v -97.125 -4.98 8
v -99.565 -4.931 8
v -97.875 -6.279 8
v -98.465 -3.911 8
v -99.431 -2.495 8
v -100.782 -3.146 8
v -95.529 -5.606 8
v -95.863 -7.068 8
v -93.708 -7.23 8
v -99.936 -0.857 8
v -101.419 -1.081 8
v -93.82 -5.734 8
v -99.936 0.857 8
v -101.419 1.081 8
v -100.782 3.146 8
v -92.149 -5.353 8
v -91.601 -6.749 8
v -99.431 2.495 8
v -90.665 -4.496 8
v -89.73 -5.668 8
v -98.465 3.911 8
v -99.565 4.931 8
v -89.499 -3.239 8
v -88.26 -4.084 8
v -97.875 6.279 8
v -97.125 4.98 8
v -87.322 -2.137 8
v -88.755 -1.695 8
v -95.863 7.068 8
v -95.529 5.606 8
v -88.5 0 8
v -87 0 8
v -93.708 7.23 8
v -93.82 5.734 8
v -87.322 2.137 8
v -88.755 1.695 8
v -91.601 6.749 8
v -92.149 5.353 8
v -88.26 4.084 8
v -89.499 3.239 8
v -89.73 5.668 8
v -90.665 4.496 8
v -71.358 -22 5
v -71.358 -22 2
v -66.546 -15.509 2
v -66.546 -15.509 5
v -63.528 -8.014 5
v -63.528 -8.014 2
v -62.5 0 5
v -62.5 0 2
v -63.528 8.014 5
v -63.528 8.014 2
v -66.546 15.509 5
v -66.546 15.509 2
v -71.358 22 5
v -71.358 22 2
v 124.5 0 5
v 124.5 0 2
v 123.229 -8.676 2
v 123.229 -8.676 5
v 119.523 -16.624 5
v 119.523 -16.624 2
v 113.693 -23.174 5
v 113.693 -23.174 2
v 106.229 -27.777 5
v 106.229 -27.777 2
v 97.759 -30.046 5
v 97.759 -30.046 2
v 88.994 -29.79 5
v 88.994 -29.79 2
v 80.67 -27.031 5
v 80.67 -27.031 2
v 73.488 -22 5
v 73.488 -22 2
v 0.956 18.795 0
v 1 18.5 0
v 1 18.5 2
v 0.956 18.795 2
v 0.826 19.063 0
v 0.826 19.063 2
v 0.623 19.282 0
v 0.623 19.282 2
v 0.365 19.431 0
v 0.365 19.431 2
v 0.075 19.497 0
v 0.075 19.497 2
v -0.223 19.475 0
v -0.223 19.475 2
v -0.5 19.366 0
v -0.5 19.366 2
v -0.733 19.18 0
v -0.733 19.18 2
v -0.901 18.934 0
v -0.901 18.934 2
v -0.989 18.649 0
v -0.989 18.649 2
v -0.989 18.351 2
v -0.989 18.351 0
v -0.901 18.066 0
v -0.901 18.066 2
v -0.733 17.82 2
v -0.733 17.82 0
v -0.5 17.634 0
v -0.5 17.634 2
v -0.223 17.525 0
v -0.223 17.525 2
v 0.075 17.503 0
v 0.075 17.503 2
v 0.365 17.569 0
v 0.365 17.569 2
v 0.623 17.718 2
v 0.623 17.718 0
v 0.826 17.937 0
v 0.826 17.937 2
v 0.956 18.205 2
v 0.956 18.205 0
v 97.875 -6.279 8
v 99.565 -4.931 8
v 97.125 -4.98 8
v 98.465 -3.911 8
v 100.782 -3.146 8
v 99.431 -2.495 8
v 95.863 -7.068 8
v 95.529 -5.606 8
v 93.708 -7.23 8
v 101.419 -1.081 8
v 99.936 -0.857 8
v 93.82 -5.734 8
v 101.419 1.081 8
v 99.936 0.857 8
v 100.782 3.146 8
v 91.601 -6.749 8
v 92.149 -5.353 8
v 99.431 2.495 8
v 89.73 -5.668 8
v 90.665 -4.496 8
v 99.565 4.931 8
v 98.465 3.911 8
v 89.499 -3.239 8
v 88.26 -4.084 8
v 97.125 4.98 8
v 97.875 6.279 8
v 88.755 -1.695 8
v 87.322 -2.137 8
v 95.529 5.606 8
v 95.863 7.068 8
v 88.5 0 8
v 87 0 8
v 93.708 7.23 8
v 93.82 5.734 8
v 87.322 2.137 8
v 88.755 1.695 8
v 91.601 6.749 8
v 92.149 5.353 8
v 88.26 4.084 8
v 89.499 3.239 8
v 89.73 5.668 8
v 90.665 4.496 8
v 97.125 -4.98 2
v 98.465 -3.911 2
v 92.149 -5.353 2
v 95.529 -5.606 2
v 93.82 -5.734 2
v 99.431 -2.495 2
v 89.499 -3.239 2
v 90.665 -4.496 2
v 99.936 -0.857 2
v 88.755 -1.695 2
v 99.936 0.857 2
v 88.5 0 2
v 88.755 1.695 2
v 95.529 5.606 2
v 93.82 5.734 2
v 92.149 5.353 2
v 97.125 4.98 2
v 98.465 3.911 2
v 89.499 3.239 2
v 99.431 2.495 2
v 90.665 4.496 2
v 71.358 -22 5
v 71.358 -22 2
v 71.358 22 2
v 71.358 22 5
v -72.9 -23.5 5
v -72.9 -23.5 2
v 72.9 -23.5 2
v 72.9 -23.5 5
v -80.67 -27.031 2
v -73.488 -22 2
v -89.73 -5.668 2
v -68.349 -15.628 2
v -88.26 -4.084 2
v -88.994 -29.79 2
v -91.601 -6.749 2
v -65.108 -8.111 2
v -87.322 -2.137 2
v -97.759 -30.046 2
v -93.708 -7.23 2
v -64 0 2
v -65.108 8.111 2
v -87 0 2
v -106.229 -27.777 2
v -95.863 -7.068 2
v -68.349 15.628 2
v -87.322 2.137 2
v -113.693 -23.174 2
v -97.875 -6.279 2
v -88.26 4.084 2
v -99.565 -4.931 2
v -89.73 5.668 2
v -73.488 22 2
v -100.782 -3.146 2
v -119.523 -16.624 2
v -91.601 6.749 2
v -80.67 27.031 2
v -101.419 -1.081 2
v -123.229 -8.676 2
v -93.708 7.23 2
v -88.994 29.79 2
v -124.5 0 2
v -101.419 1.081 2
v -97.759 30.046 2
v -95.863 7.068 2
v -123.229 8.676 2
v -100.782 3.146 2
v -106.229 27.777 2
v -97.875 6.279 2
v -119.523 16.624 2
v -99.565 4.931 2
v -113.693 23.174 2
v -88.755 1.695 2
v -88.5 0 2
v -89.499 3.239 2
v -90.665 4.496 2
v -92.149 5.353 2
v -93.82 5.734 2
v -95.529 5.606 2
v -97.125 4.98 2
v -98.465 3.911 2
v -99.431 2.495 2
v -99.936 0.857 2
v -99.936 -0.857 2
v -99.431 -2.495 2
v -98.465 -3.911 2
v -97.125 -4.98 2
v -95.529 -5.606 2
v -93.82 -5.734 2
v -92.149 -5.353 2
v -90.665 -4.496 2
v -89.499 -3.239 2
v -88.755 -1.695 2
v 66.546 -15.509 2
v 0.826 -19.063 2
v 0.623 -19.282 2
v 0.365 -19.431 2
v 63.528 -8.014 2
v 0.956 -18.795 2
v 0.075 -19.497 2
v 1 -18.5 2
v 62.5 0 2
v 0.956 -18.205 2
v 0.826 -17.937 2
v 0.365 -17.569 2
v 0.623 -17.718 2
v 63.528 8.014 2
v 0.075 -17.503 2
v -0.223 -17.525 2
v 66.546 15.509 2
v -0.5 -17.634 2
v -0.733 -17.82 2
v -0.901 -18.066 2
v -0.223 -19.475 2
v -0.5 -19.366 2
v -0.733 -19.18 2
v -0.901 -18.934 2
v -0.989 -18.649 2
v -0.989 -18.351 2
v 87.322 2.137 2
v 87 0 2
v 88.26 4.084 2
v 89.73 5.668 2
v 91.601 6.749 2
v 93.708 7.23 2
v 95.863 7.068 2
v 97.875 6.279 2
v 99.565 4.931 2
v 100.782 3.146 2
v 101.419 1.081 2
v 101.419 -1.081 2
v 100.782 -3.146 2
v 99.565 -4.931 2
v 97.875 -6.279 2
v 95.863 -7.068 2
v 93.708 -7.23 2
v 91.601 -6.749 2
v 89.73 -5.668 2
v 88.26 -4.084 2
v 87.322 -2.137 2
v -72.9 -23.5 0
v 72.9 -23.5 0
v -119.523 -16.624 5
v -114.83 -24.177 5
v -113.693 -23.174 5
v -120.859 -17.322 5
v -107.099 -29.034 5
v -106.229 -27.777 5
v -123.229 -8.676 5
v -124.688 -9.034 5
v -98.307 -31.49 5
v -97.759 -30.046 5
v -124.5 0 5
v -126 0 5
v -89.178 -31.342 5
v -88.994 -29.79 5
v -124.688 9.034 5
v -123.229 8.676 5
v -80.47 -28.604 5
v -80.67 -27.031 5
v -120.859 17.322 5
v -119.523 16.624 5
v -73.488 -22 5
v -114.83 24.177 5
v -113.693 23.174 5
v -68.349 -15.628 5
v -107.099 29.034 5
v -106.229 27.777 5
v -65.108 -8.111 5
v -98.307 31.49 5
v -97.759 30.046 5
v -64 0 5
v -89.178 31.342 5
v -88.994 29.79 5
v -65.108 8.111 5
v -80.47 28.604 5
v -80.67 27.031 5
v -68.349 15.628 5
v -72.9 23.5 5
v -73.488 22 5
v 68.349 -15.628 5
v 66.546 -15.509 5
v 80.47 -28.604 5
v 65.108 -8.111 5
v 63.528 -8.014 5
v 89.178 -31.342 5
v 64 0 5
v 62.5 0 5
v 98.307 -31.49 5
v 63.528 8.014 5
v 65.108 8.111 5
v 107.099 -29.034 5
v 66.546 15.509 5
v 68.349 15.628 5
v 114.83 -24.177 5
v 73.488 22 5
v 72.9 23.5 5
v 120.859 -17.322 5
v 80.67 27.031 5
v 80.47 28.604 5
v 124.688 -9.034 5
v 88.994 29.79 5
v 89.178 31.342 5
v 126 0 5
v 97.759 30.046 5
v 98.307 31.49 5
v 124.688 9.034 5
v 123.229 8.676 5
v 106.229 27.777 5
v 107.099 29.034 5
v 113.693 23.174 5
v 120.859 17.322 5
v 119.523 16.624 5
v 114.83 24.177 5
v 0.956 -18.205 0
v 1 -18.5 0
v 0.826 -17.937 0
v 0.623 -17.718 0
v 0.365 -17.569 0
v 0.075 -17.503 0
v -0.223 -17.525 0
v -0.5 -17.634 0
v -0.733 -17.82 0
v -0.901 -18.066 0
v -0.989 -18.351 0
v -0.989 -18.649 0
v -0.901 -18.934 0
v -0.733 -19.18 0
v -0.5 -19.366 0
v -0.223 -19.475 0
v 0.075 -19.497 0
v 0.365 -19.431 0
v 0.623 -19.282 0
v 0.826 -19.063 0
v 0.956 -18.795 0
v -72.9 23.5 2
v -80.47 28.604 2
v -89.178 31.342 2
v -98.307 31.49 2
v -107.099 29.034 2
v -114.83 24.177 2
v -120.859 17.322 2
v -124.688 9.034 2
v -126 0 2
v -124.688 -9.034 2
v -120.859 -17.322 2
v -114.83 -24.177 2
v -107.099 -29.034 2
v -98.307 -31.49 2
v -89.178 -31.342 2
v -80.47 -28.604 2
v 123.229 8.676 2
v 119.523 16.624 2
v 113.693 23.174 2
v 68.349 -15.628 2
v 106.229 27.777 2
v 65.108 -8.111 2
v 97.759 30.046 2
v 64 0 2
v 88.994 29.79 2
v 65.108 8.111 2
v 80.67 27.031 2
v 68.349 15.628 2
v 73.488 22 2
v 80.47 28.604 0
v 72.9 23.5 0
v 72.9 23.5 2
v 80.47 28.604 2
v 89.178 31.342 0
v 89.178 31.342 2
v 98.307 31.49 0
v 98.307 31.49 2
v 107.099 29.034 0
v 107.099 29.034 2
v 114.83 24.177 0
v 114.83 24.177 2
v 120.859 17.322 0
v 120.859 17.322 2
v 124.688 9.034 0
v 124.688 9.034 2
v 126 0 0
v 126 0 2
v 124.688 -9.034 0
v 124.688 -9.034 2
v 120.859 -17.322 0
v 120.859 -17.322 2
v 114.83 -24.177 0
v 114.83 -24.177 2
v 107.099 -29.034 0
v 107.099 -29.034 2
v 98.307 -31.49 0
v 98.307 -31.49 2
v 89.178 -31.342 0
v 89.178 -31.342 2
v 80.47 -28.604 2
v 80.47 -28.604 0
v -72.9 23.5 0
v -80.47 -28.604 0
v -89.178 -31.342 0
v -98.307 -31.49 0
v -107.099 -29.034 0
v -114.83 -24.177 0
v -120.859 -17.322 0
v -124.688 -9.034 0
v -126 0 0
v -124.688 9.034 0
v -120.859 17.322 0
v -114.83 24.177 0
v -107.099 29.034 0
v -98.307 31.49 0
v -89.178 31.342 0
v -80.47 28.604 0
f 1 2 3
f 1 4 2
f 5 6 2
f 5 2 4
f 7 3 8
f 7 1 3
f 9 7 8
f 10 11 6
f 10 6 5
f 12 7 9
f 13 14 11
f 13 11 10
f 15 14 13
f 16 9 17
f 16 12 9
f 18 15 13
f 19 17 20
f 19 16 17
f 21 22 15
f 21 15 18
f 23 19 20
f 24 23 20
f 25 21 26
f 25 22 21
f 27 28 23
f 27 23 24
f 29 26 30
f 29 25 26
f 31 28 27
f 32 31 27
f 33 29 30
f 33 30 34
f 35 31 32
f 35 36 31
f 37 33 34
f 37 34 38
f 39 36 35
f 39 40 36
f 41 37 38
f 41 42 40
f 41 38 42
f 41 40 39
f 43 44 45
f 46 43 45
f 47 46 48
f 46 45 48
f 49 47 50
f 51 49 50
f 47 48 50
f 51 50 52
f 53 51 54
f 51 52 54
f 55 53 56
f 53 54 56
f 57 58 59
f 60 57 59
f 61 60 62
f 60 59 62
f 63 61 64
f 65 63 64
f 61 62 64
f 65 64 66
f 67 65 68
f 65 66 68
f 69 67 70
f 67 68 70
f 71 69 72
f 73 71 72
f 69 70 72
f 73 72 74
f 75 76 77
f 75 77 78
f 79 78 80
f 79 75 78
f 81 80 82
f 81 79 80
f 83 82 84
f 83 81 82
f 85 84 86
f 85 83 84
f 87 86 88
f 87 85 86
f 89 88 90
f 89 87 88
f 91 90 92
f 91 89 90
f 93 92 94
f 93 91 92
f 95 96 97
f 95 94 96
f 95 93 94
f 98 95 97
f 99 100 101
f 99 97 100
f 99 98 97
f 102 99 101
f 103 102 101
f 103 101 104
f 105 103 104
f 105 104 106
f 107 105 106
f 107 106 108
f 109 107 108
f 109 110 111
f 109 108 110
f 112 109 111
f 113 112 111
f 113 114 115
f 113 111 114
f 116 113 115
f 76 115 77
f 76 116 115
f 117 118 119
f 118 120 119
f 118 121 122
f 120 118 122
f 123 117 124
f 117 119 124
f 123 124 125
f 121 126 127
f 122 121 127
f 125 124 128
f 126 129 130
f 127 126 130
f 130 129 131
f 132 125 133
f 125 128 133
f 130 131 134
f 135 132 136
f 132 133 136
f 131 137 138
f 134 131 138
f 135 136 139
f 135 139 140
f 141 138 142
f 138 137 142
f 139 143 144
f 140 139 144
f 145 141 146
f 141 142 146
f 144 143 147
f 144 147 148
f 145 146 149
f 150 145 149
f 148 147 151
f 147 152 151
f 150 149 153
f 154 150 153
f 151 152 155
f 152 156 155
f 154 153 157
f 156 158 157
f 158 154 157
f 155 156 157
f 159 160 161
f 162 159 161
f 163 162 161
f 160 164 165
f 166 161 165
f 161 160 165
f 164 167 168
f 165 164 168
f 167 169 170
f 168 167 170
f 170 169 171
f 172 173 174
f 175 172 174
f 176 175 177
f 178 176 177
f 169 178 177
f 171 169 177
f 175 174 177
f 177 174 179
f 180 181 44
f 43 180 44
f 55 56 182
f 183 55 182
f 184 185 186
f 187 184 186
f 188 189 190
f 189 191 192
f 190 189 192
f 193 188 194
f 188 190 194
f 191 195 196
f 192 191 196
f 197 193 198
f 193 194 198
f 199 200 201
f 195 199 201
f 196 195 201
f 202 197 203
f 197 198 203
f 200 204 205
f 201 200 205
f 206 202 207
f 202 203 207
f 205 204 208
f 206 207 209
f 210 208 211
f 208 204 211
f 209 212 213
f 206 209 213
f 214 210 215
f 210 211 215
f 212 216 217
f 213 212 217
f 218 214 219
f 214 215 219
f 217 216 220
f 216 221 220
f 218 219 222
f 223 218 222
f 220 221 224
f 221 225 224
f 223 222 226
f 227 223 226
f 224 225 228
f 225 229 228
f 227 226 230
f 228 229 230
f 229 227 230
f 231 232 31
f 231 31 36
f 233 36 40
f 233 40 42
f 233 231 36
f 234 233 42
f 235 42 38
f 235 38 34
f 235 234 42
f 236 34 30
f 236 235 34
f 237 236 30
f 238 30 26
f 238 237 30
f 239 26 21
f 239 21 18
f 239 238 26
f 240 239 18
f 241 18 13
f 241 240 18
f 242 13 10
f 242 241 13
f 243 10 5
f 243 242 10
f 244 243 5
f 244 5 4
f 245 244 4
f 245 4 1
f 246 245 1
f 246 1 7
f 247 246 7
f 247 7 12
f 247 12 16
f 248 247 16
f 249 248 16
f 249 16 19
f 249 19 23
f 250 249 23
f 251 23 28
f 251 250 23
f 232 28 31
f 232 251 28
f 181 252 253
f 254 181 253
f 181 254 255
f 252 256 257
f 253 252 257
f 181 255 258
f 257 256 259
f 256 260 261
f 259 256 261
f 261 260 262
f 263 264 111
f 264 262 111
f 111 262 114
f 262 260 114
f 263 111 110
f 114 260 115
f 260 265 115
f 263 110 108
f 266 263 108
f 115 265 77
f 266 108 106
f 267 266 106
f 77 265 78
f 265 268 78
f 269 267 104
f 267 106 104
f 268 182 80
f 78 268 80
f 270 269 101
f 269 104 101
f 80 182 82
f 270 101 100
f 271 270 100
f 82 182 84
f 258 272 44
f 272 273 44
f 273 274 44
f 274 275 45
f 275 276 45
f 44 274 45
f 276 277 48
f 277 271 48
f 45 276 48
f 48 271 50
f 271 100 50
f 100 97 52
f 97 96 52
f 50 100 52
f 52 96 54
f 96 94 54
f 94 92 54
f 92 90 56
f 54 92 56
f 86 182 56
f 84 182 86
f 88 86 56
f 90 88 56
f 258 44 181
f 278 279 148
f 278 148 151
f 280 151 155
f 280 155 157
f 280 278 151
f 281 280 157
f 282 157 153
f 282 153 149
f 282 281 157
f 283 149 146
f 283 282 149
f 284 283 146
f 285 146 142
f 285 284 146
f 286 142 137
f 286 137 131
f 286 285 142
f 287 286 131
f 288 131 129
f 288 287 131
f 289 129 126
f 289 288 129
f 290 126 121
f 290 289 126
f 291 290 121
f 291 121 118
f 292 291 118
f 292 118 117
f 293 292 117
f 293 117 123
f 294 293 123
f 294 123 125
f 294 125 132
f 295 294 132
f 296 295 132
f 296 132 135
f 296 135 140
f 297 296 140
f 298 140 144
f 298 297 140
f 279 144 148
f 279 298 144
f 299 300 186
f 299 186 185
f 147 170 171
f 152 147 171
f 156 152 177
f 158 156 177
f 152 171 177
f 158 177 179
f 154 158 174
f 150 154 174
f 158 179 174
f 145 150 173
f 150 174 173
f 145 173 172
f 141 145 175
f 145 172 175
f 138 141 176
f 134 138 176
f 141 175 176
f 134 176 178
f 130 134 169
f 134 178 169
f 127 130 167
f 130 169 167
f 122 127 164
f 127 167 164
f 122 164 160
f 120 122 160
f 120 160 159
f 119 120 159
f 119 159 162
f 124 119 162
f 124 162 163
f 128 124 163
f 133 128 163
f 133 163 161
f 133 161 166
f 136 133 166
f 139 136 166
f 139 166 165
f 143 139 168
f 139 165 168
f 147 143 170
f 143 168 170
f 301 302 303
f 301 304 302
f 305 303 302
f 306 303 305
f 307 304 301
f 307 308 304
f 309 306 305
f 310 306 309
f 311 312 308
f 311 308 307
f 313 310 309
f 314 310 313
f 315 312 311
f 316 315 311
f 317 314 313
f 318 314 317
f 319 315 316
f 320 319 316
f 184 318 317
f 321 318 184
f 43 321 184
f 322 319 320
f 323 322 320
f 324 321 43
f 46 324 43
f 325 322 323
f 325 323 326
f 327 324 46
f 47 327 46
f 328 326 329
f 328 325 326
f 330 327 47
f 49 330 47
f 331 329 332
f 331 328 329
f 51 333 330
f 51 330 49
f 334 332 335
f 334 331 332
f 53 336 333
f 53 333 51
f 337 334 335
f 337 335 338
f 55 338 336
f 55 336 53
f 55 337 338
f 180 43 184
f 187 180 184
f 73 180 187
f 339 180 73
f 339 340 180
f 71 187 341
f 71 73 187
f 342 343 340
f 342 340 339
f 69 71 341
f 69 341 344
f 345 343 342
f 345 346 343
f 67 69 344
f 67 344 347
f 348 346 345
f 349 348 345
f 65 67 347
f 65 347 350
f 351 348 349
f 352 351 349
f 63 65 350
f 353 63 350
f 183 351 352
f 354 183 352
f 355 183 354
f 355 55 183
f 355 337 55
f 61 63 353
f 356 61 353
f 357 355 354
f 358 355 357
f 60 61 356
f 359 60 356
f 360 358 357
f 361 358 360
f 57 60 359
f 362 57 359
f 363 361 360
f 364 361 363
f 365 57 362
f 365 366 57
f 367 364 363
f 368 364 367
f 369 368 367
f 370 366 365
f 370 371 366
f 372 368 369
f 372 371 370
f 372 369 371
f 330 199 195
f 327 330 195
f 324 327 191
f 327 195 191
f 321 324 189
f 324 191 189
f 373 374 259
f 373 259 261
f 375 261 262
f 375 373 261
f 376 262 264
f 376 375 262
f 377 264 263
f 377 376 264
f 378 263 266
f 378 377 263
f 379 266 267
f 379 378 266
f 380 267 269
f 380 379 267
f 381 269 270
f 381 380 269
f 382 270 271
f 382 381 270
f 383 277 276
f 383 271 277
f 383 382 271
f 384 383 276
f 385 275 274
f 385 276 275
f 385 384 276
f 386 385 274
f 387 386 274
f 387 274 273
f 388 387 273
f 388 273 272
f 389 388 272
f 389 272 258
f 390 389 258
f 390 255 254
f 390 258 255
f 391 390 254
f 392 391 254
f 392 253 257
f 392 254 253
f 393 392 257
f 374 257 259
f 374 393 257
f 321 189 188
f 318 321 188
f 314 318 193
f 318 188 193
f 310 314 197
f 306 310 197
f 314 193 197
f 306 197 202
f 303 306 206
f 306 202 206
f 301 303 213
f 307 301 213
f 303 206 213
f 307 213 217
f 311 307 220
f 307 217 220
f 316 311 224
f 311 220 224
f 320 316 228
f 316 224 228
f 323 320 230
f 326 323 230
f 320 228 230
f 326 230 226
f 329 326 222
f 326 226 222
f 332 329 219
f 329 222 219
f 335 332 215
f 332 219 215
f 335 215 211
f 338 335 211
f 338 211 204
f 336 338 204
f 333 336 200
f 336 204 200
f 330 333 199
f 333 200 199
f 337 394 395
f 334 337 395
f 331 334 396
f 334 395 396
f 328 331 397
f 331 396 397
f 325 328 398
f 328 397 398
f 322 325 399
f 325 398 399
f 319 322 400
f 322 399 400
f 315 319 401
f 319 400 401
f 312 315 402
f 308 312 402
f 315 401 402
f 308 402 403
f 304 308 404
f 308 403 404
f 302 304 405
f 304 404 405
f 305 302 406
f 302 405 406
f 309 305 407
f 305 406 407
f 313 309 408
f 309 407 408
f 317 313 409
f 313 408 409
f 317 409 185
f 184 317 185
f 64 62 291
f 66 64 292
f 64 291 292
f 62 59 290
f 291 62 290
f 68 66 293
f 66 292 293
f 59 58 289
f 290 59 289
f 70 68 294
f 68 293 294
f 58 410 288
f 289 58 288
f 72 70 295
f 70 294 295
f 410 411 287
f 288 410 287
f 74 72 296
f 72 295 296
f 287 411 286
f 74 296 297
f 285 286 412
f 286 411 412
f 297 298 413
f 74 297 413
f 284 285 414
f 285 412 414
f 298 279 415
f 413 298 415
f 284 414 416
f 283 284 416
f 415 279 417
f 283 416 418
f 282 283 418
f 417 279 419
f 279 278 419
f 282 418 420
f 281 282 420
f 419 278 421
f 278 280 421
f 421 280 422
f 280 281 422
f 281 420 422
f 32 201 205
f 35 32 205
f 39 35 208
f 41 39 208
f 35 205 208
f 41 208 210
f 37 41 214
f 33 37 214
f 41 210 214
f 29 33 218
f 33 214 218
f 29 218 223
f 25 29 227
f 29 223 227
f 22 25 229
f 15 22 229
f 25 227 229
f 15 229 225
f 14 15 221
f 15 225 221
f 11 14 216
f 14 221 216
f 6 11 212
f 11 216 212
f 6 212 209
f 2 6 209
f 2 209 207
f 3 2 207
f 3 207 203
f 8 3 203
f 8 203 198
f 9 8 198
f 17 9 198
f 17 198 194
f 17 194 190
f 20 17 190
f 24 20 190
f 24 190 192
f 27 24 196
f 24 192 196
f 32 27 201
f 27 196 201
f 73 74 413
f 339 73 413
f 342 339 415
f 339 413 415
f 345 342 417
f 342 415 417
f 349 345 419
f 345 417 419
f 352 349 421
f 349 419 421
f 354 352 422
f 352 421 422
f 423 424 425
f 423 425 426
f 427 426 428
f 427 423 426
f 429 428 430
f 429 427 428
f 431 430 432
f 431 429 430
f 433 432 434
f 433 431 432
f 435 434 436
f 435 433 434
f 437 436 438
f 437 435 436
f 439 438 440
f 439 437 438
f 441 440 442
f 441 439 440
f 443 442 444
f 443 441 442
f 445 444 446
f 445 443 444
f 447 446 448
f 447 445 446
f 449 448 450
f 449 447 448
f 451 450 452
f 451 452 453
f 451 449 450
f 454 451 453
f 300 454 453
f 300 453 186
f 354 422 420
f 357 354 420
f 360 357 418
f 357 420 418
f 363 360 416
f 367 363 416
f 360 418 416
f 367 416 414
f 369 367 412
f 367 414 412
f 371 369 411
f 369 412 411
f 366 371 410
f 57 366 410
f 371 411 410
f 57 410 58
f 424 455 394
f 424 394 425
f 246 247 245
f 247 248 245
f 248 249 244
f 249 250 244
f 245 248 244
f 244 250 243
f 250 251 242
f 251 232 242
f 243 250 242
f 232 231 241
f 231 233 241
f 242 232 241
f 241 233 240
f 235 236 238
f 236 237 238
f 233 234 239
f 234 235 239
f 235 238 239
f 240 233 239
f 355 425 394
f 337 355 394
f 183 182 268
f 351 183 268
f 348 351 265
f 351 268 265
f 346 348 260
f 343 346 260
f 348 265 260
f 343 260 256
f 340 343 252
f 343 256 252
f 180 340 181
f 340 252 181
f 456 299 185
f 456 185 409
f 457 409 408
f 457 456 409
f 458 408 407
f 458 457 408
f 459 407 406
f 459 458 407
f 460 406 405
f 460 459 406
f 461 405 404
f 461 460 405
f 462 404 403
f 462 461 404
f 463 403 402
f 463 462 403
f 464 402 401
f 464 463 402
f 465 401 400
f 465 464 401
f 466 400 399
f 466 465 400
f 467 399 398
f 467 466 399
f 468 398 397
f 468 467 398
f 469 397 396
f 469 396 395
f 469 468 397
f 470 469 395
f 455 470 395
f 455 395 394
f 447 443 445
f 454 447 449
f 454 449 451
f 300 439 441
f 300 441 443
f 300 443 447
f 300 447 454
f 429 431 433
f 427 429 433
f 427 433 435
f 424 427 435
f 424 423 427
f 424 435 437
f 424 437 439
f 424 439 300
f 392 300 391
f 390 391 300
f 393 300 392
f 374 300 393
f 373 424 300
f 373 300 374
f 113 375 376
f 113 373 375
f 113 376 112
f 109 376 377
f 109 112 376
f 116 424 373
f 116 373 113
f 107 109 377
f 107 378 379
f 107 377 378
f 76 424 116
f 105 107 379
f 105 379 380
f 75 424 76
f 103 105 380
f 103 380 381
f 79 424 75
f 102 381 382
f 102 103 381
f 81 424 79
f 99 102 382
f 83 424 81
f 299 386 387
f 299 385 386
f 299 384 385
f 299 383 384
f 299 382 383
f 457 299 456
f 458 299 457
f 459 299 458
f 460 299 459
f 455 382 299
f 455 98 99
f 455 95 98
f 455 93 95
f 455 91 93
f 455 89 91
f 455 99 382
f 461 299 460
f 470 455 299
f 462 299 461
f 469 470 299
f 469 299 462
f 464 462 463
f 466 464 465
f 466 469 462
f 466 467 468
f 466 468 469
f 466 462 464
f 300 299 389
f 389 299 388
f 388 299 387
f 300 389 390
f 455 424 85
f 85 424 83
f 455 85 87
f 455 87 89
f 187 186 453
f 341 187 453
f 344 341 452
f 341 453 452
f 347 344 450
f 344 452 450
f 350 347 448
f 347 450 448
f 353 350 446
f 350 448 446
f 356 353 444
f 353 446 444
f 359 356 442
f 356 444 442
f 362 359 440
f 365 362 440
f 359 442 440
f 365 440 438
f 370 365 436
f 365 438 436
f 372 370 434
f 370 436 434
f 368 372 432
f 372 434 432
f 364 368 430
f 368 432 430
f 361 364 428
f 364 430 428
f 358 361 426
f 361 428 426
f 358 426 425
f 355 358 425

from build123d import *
from build123d.topology import SkipClean

# Parameters (mm, degrees)
BOSS_EXTRUDE1_DEPTH     = 2
BOSS_EXTRUDE2_DEPTH     = 3
CUT_EXTRUDE1_DEPTH      = 130.973314569
CUT_EXTRUDE1_DEPTH_BACK = 130.973314569
SKETCH3_R               = 1
SKETCH4_R               = 7.25
SKETCH4_R_2             = 5.75
BOSS_EXTRUDE3_DEPTH     = 6


with BuildPart() as part:
    # Sketch1 → Boss-Extrude1 (new body)
    with BuildSketch(Plane.XY):
        with BuildLine():
            Line((72.900234193, -23.5), (-72.900234193, -23.5))
            ThreePointArc((-72.900234193, -23.5), (-126, 0), (-72.900234193, 23.5))
            Line((-72.900234193, 23.5), (72.900234193, 23.5))
            ThreePointArc((72.900234193, 23.5), (126, 0), (72.900234193, -23.5))
        make_face()
    extrude(amount=BOSS_EXTRUDE1_DEPTH)

    # Sketch2 → Boss-Extrude2 (add)
    with SkipClean():  # the faces are left unmerged after this step: merging them gives an invalid solid
        with BuildSketch(Plane.XY.offset(2)):
            with BuildLine():
                ThreePointArc((-72.900234193, 23.5), (-126, 0), (-72.900234193, -23.5))
                Line((-72.900234193, -23.5), (72.900234193, -23.5))
                ThreePointArc((72.900234193, -23.5), (126, 0), (72.900234193, 23.5))
                Line((72.900234193, 23.5), (-72.900234193, 23.5))
            make_face()
            with BuildLine():
                ThreePointArc((-73.487955303, -22), (-124.5, 0), (-73.487955303, 22))
                ThreePointArc((-73.487955303, 22), (-66.473081956, 11.979370766), (-64, 0))
                ThreePointArc((-64, 0), (-66.473081956, -11.979370766), (-73.487955303, -22))
            make_face(mode=Mode.SUBTRACT)
            with BuildLine():
                Line((71.357588594, -22), (-71.357588594, -22))
                ThreePointArc((-71.357588594, -22), (-62.5, 0), (-71.357588594, 22))
                Line((-71.357588594, 22), (71.357588594, 22))
                ThreePointArc((71.357588594, 22), (62.5, 0), (71.357588594, -22))
            make_face(mode=Mode.SUBTRACT)
            with BuildLine():
                ThreePointArc((124.5, 0), (106.229370766, -27.776918044), (73.487955303, -22))
                ThreePointArc((73.487955303, -22), (64, 0), (73.487955303, 22))
                ThreePointArc((73.487955303, 22), (106.229370766, 27.776918044), (124.5, 0))
            make_face(mode=Mode.SUBTRACT)
        extrude(amount=BOSS_EXTRUDE2_DEPTH)

    # Sketch3 → Cut-Extrude1 (cut, two sides: drawn at the far end of the back side and taken through both)
    with SkipClean():  # the faces are left unmerged after this step: merging them gives an invalid solid
        with BuildSketch(Plane.XY.offset(2).offset(-CUT_EXTRUDE1_DEPTH_BACK)):
            with Locations((0, -18.5)):
                Circle(SKETCH3_R)
            with Locations((0, 18.5)):
                Circle(SKETCH3_R)
        extrude(amount=CUT_EXTRUDE1_DEPTH + CUT_EXTRUDE1_DEPTH_BACK, mode=Mode.SUBTRACT)

    # Sketch4 → Boss-Extrude3 (add)
    with SkipClean():  # the faces are left unmerged after this step: merging them gives an invalid solid
        with BuildSketch(Plane.XY.offset(2)):
            with Locations((-94.25, 0)):
                Circle(SKETCH4_R)
            with Locations((-94.25, 0)):
                Circle(SKETCH4_R_2, mode=Mode.SUBTRACT)
        boss_extrude3 = extrude(amount=BOSS_EXTRUDE3_DEPTH)

    # Mirror1: Boss-Extrude3 across plane
    with SkipClean():  # the faces are left unmerged after this step: merging them gives an invalid solid
        add(boss_extrude3.mirror(Plane(origin=(0, 0, 0), x_dir=(0, 0, 1), z_dir=(1, 0, 0))))


solid = part.part
